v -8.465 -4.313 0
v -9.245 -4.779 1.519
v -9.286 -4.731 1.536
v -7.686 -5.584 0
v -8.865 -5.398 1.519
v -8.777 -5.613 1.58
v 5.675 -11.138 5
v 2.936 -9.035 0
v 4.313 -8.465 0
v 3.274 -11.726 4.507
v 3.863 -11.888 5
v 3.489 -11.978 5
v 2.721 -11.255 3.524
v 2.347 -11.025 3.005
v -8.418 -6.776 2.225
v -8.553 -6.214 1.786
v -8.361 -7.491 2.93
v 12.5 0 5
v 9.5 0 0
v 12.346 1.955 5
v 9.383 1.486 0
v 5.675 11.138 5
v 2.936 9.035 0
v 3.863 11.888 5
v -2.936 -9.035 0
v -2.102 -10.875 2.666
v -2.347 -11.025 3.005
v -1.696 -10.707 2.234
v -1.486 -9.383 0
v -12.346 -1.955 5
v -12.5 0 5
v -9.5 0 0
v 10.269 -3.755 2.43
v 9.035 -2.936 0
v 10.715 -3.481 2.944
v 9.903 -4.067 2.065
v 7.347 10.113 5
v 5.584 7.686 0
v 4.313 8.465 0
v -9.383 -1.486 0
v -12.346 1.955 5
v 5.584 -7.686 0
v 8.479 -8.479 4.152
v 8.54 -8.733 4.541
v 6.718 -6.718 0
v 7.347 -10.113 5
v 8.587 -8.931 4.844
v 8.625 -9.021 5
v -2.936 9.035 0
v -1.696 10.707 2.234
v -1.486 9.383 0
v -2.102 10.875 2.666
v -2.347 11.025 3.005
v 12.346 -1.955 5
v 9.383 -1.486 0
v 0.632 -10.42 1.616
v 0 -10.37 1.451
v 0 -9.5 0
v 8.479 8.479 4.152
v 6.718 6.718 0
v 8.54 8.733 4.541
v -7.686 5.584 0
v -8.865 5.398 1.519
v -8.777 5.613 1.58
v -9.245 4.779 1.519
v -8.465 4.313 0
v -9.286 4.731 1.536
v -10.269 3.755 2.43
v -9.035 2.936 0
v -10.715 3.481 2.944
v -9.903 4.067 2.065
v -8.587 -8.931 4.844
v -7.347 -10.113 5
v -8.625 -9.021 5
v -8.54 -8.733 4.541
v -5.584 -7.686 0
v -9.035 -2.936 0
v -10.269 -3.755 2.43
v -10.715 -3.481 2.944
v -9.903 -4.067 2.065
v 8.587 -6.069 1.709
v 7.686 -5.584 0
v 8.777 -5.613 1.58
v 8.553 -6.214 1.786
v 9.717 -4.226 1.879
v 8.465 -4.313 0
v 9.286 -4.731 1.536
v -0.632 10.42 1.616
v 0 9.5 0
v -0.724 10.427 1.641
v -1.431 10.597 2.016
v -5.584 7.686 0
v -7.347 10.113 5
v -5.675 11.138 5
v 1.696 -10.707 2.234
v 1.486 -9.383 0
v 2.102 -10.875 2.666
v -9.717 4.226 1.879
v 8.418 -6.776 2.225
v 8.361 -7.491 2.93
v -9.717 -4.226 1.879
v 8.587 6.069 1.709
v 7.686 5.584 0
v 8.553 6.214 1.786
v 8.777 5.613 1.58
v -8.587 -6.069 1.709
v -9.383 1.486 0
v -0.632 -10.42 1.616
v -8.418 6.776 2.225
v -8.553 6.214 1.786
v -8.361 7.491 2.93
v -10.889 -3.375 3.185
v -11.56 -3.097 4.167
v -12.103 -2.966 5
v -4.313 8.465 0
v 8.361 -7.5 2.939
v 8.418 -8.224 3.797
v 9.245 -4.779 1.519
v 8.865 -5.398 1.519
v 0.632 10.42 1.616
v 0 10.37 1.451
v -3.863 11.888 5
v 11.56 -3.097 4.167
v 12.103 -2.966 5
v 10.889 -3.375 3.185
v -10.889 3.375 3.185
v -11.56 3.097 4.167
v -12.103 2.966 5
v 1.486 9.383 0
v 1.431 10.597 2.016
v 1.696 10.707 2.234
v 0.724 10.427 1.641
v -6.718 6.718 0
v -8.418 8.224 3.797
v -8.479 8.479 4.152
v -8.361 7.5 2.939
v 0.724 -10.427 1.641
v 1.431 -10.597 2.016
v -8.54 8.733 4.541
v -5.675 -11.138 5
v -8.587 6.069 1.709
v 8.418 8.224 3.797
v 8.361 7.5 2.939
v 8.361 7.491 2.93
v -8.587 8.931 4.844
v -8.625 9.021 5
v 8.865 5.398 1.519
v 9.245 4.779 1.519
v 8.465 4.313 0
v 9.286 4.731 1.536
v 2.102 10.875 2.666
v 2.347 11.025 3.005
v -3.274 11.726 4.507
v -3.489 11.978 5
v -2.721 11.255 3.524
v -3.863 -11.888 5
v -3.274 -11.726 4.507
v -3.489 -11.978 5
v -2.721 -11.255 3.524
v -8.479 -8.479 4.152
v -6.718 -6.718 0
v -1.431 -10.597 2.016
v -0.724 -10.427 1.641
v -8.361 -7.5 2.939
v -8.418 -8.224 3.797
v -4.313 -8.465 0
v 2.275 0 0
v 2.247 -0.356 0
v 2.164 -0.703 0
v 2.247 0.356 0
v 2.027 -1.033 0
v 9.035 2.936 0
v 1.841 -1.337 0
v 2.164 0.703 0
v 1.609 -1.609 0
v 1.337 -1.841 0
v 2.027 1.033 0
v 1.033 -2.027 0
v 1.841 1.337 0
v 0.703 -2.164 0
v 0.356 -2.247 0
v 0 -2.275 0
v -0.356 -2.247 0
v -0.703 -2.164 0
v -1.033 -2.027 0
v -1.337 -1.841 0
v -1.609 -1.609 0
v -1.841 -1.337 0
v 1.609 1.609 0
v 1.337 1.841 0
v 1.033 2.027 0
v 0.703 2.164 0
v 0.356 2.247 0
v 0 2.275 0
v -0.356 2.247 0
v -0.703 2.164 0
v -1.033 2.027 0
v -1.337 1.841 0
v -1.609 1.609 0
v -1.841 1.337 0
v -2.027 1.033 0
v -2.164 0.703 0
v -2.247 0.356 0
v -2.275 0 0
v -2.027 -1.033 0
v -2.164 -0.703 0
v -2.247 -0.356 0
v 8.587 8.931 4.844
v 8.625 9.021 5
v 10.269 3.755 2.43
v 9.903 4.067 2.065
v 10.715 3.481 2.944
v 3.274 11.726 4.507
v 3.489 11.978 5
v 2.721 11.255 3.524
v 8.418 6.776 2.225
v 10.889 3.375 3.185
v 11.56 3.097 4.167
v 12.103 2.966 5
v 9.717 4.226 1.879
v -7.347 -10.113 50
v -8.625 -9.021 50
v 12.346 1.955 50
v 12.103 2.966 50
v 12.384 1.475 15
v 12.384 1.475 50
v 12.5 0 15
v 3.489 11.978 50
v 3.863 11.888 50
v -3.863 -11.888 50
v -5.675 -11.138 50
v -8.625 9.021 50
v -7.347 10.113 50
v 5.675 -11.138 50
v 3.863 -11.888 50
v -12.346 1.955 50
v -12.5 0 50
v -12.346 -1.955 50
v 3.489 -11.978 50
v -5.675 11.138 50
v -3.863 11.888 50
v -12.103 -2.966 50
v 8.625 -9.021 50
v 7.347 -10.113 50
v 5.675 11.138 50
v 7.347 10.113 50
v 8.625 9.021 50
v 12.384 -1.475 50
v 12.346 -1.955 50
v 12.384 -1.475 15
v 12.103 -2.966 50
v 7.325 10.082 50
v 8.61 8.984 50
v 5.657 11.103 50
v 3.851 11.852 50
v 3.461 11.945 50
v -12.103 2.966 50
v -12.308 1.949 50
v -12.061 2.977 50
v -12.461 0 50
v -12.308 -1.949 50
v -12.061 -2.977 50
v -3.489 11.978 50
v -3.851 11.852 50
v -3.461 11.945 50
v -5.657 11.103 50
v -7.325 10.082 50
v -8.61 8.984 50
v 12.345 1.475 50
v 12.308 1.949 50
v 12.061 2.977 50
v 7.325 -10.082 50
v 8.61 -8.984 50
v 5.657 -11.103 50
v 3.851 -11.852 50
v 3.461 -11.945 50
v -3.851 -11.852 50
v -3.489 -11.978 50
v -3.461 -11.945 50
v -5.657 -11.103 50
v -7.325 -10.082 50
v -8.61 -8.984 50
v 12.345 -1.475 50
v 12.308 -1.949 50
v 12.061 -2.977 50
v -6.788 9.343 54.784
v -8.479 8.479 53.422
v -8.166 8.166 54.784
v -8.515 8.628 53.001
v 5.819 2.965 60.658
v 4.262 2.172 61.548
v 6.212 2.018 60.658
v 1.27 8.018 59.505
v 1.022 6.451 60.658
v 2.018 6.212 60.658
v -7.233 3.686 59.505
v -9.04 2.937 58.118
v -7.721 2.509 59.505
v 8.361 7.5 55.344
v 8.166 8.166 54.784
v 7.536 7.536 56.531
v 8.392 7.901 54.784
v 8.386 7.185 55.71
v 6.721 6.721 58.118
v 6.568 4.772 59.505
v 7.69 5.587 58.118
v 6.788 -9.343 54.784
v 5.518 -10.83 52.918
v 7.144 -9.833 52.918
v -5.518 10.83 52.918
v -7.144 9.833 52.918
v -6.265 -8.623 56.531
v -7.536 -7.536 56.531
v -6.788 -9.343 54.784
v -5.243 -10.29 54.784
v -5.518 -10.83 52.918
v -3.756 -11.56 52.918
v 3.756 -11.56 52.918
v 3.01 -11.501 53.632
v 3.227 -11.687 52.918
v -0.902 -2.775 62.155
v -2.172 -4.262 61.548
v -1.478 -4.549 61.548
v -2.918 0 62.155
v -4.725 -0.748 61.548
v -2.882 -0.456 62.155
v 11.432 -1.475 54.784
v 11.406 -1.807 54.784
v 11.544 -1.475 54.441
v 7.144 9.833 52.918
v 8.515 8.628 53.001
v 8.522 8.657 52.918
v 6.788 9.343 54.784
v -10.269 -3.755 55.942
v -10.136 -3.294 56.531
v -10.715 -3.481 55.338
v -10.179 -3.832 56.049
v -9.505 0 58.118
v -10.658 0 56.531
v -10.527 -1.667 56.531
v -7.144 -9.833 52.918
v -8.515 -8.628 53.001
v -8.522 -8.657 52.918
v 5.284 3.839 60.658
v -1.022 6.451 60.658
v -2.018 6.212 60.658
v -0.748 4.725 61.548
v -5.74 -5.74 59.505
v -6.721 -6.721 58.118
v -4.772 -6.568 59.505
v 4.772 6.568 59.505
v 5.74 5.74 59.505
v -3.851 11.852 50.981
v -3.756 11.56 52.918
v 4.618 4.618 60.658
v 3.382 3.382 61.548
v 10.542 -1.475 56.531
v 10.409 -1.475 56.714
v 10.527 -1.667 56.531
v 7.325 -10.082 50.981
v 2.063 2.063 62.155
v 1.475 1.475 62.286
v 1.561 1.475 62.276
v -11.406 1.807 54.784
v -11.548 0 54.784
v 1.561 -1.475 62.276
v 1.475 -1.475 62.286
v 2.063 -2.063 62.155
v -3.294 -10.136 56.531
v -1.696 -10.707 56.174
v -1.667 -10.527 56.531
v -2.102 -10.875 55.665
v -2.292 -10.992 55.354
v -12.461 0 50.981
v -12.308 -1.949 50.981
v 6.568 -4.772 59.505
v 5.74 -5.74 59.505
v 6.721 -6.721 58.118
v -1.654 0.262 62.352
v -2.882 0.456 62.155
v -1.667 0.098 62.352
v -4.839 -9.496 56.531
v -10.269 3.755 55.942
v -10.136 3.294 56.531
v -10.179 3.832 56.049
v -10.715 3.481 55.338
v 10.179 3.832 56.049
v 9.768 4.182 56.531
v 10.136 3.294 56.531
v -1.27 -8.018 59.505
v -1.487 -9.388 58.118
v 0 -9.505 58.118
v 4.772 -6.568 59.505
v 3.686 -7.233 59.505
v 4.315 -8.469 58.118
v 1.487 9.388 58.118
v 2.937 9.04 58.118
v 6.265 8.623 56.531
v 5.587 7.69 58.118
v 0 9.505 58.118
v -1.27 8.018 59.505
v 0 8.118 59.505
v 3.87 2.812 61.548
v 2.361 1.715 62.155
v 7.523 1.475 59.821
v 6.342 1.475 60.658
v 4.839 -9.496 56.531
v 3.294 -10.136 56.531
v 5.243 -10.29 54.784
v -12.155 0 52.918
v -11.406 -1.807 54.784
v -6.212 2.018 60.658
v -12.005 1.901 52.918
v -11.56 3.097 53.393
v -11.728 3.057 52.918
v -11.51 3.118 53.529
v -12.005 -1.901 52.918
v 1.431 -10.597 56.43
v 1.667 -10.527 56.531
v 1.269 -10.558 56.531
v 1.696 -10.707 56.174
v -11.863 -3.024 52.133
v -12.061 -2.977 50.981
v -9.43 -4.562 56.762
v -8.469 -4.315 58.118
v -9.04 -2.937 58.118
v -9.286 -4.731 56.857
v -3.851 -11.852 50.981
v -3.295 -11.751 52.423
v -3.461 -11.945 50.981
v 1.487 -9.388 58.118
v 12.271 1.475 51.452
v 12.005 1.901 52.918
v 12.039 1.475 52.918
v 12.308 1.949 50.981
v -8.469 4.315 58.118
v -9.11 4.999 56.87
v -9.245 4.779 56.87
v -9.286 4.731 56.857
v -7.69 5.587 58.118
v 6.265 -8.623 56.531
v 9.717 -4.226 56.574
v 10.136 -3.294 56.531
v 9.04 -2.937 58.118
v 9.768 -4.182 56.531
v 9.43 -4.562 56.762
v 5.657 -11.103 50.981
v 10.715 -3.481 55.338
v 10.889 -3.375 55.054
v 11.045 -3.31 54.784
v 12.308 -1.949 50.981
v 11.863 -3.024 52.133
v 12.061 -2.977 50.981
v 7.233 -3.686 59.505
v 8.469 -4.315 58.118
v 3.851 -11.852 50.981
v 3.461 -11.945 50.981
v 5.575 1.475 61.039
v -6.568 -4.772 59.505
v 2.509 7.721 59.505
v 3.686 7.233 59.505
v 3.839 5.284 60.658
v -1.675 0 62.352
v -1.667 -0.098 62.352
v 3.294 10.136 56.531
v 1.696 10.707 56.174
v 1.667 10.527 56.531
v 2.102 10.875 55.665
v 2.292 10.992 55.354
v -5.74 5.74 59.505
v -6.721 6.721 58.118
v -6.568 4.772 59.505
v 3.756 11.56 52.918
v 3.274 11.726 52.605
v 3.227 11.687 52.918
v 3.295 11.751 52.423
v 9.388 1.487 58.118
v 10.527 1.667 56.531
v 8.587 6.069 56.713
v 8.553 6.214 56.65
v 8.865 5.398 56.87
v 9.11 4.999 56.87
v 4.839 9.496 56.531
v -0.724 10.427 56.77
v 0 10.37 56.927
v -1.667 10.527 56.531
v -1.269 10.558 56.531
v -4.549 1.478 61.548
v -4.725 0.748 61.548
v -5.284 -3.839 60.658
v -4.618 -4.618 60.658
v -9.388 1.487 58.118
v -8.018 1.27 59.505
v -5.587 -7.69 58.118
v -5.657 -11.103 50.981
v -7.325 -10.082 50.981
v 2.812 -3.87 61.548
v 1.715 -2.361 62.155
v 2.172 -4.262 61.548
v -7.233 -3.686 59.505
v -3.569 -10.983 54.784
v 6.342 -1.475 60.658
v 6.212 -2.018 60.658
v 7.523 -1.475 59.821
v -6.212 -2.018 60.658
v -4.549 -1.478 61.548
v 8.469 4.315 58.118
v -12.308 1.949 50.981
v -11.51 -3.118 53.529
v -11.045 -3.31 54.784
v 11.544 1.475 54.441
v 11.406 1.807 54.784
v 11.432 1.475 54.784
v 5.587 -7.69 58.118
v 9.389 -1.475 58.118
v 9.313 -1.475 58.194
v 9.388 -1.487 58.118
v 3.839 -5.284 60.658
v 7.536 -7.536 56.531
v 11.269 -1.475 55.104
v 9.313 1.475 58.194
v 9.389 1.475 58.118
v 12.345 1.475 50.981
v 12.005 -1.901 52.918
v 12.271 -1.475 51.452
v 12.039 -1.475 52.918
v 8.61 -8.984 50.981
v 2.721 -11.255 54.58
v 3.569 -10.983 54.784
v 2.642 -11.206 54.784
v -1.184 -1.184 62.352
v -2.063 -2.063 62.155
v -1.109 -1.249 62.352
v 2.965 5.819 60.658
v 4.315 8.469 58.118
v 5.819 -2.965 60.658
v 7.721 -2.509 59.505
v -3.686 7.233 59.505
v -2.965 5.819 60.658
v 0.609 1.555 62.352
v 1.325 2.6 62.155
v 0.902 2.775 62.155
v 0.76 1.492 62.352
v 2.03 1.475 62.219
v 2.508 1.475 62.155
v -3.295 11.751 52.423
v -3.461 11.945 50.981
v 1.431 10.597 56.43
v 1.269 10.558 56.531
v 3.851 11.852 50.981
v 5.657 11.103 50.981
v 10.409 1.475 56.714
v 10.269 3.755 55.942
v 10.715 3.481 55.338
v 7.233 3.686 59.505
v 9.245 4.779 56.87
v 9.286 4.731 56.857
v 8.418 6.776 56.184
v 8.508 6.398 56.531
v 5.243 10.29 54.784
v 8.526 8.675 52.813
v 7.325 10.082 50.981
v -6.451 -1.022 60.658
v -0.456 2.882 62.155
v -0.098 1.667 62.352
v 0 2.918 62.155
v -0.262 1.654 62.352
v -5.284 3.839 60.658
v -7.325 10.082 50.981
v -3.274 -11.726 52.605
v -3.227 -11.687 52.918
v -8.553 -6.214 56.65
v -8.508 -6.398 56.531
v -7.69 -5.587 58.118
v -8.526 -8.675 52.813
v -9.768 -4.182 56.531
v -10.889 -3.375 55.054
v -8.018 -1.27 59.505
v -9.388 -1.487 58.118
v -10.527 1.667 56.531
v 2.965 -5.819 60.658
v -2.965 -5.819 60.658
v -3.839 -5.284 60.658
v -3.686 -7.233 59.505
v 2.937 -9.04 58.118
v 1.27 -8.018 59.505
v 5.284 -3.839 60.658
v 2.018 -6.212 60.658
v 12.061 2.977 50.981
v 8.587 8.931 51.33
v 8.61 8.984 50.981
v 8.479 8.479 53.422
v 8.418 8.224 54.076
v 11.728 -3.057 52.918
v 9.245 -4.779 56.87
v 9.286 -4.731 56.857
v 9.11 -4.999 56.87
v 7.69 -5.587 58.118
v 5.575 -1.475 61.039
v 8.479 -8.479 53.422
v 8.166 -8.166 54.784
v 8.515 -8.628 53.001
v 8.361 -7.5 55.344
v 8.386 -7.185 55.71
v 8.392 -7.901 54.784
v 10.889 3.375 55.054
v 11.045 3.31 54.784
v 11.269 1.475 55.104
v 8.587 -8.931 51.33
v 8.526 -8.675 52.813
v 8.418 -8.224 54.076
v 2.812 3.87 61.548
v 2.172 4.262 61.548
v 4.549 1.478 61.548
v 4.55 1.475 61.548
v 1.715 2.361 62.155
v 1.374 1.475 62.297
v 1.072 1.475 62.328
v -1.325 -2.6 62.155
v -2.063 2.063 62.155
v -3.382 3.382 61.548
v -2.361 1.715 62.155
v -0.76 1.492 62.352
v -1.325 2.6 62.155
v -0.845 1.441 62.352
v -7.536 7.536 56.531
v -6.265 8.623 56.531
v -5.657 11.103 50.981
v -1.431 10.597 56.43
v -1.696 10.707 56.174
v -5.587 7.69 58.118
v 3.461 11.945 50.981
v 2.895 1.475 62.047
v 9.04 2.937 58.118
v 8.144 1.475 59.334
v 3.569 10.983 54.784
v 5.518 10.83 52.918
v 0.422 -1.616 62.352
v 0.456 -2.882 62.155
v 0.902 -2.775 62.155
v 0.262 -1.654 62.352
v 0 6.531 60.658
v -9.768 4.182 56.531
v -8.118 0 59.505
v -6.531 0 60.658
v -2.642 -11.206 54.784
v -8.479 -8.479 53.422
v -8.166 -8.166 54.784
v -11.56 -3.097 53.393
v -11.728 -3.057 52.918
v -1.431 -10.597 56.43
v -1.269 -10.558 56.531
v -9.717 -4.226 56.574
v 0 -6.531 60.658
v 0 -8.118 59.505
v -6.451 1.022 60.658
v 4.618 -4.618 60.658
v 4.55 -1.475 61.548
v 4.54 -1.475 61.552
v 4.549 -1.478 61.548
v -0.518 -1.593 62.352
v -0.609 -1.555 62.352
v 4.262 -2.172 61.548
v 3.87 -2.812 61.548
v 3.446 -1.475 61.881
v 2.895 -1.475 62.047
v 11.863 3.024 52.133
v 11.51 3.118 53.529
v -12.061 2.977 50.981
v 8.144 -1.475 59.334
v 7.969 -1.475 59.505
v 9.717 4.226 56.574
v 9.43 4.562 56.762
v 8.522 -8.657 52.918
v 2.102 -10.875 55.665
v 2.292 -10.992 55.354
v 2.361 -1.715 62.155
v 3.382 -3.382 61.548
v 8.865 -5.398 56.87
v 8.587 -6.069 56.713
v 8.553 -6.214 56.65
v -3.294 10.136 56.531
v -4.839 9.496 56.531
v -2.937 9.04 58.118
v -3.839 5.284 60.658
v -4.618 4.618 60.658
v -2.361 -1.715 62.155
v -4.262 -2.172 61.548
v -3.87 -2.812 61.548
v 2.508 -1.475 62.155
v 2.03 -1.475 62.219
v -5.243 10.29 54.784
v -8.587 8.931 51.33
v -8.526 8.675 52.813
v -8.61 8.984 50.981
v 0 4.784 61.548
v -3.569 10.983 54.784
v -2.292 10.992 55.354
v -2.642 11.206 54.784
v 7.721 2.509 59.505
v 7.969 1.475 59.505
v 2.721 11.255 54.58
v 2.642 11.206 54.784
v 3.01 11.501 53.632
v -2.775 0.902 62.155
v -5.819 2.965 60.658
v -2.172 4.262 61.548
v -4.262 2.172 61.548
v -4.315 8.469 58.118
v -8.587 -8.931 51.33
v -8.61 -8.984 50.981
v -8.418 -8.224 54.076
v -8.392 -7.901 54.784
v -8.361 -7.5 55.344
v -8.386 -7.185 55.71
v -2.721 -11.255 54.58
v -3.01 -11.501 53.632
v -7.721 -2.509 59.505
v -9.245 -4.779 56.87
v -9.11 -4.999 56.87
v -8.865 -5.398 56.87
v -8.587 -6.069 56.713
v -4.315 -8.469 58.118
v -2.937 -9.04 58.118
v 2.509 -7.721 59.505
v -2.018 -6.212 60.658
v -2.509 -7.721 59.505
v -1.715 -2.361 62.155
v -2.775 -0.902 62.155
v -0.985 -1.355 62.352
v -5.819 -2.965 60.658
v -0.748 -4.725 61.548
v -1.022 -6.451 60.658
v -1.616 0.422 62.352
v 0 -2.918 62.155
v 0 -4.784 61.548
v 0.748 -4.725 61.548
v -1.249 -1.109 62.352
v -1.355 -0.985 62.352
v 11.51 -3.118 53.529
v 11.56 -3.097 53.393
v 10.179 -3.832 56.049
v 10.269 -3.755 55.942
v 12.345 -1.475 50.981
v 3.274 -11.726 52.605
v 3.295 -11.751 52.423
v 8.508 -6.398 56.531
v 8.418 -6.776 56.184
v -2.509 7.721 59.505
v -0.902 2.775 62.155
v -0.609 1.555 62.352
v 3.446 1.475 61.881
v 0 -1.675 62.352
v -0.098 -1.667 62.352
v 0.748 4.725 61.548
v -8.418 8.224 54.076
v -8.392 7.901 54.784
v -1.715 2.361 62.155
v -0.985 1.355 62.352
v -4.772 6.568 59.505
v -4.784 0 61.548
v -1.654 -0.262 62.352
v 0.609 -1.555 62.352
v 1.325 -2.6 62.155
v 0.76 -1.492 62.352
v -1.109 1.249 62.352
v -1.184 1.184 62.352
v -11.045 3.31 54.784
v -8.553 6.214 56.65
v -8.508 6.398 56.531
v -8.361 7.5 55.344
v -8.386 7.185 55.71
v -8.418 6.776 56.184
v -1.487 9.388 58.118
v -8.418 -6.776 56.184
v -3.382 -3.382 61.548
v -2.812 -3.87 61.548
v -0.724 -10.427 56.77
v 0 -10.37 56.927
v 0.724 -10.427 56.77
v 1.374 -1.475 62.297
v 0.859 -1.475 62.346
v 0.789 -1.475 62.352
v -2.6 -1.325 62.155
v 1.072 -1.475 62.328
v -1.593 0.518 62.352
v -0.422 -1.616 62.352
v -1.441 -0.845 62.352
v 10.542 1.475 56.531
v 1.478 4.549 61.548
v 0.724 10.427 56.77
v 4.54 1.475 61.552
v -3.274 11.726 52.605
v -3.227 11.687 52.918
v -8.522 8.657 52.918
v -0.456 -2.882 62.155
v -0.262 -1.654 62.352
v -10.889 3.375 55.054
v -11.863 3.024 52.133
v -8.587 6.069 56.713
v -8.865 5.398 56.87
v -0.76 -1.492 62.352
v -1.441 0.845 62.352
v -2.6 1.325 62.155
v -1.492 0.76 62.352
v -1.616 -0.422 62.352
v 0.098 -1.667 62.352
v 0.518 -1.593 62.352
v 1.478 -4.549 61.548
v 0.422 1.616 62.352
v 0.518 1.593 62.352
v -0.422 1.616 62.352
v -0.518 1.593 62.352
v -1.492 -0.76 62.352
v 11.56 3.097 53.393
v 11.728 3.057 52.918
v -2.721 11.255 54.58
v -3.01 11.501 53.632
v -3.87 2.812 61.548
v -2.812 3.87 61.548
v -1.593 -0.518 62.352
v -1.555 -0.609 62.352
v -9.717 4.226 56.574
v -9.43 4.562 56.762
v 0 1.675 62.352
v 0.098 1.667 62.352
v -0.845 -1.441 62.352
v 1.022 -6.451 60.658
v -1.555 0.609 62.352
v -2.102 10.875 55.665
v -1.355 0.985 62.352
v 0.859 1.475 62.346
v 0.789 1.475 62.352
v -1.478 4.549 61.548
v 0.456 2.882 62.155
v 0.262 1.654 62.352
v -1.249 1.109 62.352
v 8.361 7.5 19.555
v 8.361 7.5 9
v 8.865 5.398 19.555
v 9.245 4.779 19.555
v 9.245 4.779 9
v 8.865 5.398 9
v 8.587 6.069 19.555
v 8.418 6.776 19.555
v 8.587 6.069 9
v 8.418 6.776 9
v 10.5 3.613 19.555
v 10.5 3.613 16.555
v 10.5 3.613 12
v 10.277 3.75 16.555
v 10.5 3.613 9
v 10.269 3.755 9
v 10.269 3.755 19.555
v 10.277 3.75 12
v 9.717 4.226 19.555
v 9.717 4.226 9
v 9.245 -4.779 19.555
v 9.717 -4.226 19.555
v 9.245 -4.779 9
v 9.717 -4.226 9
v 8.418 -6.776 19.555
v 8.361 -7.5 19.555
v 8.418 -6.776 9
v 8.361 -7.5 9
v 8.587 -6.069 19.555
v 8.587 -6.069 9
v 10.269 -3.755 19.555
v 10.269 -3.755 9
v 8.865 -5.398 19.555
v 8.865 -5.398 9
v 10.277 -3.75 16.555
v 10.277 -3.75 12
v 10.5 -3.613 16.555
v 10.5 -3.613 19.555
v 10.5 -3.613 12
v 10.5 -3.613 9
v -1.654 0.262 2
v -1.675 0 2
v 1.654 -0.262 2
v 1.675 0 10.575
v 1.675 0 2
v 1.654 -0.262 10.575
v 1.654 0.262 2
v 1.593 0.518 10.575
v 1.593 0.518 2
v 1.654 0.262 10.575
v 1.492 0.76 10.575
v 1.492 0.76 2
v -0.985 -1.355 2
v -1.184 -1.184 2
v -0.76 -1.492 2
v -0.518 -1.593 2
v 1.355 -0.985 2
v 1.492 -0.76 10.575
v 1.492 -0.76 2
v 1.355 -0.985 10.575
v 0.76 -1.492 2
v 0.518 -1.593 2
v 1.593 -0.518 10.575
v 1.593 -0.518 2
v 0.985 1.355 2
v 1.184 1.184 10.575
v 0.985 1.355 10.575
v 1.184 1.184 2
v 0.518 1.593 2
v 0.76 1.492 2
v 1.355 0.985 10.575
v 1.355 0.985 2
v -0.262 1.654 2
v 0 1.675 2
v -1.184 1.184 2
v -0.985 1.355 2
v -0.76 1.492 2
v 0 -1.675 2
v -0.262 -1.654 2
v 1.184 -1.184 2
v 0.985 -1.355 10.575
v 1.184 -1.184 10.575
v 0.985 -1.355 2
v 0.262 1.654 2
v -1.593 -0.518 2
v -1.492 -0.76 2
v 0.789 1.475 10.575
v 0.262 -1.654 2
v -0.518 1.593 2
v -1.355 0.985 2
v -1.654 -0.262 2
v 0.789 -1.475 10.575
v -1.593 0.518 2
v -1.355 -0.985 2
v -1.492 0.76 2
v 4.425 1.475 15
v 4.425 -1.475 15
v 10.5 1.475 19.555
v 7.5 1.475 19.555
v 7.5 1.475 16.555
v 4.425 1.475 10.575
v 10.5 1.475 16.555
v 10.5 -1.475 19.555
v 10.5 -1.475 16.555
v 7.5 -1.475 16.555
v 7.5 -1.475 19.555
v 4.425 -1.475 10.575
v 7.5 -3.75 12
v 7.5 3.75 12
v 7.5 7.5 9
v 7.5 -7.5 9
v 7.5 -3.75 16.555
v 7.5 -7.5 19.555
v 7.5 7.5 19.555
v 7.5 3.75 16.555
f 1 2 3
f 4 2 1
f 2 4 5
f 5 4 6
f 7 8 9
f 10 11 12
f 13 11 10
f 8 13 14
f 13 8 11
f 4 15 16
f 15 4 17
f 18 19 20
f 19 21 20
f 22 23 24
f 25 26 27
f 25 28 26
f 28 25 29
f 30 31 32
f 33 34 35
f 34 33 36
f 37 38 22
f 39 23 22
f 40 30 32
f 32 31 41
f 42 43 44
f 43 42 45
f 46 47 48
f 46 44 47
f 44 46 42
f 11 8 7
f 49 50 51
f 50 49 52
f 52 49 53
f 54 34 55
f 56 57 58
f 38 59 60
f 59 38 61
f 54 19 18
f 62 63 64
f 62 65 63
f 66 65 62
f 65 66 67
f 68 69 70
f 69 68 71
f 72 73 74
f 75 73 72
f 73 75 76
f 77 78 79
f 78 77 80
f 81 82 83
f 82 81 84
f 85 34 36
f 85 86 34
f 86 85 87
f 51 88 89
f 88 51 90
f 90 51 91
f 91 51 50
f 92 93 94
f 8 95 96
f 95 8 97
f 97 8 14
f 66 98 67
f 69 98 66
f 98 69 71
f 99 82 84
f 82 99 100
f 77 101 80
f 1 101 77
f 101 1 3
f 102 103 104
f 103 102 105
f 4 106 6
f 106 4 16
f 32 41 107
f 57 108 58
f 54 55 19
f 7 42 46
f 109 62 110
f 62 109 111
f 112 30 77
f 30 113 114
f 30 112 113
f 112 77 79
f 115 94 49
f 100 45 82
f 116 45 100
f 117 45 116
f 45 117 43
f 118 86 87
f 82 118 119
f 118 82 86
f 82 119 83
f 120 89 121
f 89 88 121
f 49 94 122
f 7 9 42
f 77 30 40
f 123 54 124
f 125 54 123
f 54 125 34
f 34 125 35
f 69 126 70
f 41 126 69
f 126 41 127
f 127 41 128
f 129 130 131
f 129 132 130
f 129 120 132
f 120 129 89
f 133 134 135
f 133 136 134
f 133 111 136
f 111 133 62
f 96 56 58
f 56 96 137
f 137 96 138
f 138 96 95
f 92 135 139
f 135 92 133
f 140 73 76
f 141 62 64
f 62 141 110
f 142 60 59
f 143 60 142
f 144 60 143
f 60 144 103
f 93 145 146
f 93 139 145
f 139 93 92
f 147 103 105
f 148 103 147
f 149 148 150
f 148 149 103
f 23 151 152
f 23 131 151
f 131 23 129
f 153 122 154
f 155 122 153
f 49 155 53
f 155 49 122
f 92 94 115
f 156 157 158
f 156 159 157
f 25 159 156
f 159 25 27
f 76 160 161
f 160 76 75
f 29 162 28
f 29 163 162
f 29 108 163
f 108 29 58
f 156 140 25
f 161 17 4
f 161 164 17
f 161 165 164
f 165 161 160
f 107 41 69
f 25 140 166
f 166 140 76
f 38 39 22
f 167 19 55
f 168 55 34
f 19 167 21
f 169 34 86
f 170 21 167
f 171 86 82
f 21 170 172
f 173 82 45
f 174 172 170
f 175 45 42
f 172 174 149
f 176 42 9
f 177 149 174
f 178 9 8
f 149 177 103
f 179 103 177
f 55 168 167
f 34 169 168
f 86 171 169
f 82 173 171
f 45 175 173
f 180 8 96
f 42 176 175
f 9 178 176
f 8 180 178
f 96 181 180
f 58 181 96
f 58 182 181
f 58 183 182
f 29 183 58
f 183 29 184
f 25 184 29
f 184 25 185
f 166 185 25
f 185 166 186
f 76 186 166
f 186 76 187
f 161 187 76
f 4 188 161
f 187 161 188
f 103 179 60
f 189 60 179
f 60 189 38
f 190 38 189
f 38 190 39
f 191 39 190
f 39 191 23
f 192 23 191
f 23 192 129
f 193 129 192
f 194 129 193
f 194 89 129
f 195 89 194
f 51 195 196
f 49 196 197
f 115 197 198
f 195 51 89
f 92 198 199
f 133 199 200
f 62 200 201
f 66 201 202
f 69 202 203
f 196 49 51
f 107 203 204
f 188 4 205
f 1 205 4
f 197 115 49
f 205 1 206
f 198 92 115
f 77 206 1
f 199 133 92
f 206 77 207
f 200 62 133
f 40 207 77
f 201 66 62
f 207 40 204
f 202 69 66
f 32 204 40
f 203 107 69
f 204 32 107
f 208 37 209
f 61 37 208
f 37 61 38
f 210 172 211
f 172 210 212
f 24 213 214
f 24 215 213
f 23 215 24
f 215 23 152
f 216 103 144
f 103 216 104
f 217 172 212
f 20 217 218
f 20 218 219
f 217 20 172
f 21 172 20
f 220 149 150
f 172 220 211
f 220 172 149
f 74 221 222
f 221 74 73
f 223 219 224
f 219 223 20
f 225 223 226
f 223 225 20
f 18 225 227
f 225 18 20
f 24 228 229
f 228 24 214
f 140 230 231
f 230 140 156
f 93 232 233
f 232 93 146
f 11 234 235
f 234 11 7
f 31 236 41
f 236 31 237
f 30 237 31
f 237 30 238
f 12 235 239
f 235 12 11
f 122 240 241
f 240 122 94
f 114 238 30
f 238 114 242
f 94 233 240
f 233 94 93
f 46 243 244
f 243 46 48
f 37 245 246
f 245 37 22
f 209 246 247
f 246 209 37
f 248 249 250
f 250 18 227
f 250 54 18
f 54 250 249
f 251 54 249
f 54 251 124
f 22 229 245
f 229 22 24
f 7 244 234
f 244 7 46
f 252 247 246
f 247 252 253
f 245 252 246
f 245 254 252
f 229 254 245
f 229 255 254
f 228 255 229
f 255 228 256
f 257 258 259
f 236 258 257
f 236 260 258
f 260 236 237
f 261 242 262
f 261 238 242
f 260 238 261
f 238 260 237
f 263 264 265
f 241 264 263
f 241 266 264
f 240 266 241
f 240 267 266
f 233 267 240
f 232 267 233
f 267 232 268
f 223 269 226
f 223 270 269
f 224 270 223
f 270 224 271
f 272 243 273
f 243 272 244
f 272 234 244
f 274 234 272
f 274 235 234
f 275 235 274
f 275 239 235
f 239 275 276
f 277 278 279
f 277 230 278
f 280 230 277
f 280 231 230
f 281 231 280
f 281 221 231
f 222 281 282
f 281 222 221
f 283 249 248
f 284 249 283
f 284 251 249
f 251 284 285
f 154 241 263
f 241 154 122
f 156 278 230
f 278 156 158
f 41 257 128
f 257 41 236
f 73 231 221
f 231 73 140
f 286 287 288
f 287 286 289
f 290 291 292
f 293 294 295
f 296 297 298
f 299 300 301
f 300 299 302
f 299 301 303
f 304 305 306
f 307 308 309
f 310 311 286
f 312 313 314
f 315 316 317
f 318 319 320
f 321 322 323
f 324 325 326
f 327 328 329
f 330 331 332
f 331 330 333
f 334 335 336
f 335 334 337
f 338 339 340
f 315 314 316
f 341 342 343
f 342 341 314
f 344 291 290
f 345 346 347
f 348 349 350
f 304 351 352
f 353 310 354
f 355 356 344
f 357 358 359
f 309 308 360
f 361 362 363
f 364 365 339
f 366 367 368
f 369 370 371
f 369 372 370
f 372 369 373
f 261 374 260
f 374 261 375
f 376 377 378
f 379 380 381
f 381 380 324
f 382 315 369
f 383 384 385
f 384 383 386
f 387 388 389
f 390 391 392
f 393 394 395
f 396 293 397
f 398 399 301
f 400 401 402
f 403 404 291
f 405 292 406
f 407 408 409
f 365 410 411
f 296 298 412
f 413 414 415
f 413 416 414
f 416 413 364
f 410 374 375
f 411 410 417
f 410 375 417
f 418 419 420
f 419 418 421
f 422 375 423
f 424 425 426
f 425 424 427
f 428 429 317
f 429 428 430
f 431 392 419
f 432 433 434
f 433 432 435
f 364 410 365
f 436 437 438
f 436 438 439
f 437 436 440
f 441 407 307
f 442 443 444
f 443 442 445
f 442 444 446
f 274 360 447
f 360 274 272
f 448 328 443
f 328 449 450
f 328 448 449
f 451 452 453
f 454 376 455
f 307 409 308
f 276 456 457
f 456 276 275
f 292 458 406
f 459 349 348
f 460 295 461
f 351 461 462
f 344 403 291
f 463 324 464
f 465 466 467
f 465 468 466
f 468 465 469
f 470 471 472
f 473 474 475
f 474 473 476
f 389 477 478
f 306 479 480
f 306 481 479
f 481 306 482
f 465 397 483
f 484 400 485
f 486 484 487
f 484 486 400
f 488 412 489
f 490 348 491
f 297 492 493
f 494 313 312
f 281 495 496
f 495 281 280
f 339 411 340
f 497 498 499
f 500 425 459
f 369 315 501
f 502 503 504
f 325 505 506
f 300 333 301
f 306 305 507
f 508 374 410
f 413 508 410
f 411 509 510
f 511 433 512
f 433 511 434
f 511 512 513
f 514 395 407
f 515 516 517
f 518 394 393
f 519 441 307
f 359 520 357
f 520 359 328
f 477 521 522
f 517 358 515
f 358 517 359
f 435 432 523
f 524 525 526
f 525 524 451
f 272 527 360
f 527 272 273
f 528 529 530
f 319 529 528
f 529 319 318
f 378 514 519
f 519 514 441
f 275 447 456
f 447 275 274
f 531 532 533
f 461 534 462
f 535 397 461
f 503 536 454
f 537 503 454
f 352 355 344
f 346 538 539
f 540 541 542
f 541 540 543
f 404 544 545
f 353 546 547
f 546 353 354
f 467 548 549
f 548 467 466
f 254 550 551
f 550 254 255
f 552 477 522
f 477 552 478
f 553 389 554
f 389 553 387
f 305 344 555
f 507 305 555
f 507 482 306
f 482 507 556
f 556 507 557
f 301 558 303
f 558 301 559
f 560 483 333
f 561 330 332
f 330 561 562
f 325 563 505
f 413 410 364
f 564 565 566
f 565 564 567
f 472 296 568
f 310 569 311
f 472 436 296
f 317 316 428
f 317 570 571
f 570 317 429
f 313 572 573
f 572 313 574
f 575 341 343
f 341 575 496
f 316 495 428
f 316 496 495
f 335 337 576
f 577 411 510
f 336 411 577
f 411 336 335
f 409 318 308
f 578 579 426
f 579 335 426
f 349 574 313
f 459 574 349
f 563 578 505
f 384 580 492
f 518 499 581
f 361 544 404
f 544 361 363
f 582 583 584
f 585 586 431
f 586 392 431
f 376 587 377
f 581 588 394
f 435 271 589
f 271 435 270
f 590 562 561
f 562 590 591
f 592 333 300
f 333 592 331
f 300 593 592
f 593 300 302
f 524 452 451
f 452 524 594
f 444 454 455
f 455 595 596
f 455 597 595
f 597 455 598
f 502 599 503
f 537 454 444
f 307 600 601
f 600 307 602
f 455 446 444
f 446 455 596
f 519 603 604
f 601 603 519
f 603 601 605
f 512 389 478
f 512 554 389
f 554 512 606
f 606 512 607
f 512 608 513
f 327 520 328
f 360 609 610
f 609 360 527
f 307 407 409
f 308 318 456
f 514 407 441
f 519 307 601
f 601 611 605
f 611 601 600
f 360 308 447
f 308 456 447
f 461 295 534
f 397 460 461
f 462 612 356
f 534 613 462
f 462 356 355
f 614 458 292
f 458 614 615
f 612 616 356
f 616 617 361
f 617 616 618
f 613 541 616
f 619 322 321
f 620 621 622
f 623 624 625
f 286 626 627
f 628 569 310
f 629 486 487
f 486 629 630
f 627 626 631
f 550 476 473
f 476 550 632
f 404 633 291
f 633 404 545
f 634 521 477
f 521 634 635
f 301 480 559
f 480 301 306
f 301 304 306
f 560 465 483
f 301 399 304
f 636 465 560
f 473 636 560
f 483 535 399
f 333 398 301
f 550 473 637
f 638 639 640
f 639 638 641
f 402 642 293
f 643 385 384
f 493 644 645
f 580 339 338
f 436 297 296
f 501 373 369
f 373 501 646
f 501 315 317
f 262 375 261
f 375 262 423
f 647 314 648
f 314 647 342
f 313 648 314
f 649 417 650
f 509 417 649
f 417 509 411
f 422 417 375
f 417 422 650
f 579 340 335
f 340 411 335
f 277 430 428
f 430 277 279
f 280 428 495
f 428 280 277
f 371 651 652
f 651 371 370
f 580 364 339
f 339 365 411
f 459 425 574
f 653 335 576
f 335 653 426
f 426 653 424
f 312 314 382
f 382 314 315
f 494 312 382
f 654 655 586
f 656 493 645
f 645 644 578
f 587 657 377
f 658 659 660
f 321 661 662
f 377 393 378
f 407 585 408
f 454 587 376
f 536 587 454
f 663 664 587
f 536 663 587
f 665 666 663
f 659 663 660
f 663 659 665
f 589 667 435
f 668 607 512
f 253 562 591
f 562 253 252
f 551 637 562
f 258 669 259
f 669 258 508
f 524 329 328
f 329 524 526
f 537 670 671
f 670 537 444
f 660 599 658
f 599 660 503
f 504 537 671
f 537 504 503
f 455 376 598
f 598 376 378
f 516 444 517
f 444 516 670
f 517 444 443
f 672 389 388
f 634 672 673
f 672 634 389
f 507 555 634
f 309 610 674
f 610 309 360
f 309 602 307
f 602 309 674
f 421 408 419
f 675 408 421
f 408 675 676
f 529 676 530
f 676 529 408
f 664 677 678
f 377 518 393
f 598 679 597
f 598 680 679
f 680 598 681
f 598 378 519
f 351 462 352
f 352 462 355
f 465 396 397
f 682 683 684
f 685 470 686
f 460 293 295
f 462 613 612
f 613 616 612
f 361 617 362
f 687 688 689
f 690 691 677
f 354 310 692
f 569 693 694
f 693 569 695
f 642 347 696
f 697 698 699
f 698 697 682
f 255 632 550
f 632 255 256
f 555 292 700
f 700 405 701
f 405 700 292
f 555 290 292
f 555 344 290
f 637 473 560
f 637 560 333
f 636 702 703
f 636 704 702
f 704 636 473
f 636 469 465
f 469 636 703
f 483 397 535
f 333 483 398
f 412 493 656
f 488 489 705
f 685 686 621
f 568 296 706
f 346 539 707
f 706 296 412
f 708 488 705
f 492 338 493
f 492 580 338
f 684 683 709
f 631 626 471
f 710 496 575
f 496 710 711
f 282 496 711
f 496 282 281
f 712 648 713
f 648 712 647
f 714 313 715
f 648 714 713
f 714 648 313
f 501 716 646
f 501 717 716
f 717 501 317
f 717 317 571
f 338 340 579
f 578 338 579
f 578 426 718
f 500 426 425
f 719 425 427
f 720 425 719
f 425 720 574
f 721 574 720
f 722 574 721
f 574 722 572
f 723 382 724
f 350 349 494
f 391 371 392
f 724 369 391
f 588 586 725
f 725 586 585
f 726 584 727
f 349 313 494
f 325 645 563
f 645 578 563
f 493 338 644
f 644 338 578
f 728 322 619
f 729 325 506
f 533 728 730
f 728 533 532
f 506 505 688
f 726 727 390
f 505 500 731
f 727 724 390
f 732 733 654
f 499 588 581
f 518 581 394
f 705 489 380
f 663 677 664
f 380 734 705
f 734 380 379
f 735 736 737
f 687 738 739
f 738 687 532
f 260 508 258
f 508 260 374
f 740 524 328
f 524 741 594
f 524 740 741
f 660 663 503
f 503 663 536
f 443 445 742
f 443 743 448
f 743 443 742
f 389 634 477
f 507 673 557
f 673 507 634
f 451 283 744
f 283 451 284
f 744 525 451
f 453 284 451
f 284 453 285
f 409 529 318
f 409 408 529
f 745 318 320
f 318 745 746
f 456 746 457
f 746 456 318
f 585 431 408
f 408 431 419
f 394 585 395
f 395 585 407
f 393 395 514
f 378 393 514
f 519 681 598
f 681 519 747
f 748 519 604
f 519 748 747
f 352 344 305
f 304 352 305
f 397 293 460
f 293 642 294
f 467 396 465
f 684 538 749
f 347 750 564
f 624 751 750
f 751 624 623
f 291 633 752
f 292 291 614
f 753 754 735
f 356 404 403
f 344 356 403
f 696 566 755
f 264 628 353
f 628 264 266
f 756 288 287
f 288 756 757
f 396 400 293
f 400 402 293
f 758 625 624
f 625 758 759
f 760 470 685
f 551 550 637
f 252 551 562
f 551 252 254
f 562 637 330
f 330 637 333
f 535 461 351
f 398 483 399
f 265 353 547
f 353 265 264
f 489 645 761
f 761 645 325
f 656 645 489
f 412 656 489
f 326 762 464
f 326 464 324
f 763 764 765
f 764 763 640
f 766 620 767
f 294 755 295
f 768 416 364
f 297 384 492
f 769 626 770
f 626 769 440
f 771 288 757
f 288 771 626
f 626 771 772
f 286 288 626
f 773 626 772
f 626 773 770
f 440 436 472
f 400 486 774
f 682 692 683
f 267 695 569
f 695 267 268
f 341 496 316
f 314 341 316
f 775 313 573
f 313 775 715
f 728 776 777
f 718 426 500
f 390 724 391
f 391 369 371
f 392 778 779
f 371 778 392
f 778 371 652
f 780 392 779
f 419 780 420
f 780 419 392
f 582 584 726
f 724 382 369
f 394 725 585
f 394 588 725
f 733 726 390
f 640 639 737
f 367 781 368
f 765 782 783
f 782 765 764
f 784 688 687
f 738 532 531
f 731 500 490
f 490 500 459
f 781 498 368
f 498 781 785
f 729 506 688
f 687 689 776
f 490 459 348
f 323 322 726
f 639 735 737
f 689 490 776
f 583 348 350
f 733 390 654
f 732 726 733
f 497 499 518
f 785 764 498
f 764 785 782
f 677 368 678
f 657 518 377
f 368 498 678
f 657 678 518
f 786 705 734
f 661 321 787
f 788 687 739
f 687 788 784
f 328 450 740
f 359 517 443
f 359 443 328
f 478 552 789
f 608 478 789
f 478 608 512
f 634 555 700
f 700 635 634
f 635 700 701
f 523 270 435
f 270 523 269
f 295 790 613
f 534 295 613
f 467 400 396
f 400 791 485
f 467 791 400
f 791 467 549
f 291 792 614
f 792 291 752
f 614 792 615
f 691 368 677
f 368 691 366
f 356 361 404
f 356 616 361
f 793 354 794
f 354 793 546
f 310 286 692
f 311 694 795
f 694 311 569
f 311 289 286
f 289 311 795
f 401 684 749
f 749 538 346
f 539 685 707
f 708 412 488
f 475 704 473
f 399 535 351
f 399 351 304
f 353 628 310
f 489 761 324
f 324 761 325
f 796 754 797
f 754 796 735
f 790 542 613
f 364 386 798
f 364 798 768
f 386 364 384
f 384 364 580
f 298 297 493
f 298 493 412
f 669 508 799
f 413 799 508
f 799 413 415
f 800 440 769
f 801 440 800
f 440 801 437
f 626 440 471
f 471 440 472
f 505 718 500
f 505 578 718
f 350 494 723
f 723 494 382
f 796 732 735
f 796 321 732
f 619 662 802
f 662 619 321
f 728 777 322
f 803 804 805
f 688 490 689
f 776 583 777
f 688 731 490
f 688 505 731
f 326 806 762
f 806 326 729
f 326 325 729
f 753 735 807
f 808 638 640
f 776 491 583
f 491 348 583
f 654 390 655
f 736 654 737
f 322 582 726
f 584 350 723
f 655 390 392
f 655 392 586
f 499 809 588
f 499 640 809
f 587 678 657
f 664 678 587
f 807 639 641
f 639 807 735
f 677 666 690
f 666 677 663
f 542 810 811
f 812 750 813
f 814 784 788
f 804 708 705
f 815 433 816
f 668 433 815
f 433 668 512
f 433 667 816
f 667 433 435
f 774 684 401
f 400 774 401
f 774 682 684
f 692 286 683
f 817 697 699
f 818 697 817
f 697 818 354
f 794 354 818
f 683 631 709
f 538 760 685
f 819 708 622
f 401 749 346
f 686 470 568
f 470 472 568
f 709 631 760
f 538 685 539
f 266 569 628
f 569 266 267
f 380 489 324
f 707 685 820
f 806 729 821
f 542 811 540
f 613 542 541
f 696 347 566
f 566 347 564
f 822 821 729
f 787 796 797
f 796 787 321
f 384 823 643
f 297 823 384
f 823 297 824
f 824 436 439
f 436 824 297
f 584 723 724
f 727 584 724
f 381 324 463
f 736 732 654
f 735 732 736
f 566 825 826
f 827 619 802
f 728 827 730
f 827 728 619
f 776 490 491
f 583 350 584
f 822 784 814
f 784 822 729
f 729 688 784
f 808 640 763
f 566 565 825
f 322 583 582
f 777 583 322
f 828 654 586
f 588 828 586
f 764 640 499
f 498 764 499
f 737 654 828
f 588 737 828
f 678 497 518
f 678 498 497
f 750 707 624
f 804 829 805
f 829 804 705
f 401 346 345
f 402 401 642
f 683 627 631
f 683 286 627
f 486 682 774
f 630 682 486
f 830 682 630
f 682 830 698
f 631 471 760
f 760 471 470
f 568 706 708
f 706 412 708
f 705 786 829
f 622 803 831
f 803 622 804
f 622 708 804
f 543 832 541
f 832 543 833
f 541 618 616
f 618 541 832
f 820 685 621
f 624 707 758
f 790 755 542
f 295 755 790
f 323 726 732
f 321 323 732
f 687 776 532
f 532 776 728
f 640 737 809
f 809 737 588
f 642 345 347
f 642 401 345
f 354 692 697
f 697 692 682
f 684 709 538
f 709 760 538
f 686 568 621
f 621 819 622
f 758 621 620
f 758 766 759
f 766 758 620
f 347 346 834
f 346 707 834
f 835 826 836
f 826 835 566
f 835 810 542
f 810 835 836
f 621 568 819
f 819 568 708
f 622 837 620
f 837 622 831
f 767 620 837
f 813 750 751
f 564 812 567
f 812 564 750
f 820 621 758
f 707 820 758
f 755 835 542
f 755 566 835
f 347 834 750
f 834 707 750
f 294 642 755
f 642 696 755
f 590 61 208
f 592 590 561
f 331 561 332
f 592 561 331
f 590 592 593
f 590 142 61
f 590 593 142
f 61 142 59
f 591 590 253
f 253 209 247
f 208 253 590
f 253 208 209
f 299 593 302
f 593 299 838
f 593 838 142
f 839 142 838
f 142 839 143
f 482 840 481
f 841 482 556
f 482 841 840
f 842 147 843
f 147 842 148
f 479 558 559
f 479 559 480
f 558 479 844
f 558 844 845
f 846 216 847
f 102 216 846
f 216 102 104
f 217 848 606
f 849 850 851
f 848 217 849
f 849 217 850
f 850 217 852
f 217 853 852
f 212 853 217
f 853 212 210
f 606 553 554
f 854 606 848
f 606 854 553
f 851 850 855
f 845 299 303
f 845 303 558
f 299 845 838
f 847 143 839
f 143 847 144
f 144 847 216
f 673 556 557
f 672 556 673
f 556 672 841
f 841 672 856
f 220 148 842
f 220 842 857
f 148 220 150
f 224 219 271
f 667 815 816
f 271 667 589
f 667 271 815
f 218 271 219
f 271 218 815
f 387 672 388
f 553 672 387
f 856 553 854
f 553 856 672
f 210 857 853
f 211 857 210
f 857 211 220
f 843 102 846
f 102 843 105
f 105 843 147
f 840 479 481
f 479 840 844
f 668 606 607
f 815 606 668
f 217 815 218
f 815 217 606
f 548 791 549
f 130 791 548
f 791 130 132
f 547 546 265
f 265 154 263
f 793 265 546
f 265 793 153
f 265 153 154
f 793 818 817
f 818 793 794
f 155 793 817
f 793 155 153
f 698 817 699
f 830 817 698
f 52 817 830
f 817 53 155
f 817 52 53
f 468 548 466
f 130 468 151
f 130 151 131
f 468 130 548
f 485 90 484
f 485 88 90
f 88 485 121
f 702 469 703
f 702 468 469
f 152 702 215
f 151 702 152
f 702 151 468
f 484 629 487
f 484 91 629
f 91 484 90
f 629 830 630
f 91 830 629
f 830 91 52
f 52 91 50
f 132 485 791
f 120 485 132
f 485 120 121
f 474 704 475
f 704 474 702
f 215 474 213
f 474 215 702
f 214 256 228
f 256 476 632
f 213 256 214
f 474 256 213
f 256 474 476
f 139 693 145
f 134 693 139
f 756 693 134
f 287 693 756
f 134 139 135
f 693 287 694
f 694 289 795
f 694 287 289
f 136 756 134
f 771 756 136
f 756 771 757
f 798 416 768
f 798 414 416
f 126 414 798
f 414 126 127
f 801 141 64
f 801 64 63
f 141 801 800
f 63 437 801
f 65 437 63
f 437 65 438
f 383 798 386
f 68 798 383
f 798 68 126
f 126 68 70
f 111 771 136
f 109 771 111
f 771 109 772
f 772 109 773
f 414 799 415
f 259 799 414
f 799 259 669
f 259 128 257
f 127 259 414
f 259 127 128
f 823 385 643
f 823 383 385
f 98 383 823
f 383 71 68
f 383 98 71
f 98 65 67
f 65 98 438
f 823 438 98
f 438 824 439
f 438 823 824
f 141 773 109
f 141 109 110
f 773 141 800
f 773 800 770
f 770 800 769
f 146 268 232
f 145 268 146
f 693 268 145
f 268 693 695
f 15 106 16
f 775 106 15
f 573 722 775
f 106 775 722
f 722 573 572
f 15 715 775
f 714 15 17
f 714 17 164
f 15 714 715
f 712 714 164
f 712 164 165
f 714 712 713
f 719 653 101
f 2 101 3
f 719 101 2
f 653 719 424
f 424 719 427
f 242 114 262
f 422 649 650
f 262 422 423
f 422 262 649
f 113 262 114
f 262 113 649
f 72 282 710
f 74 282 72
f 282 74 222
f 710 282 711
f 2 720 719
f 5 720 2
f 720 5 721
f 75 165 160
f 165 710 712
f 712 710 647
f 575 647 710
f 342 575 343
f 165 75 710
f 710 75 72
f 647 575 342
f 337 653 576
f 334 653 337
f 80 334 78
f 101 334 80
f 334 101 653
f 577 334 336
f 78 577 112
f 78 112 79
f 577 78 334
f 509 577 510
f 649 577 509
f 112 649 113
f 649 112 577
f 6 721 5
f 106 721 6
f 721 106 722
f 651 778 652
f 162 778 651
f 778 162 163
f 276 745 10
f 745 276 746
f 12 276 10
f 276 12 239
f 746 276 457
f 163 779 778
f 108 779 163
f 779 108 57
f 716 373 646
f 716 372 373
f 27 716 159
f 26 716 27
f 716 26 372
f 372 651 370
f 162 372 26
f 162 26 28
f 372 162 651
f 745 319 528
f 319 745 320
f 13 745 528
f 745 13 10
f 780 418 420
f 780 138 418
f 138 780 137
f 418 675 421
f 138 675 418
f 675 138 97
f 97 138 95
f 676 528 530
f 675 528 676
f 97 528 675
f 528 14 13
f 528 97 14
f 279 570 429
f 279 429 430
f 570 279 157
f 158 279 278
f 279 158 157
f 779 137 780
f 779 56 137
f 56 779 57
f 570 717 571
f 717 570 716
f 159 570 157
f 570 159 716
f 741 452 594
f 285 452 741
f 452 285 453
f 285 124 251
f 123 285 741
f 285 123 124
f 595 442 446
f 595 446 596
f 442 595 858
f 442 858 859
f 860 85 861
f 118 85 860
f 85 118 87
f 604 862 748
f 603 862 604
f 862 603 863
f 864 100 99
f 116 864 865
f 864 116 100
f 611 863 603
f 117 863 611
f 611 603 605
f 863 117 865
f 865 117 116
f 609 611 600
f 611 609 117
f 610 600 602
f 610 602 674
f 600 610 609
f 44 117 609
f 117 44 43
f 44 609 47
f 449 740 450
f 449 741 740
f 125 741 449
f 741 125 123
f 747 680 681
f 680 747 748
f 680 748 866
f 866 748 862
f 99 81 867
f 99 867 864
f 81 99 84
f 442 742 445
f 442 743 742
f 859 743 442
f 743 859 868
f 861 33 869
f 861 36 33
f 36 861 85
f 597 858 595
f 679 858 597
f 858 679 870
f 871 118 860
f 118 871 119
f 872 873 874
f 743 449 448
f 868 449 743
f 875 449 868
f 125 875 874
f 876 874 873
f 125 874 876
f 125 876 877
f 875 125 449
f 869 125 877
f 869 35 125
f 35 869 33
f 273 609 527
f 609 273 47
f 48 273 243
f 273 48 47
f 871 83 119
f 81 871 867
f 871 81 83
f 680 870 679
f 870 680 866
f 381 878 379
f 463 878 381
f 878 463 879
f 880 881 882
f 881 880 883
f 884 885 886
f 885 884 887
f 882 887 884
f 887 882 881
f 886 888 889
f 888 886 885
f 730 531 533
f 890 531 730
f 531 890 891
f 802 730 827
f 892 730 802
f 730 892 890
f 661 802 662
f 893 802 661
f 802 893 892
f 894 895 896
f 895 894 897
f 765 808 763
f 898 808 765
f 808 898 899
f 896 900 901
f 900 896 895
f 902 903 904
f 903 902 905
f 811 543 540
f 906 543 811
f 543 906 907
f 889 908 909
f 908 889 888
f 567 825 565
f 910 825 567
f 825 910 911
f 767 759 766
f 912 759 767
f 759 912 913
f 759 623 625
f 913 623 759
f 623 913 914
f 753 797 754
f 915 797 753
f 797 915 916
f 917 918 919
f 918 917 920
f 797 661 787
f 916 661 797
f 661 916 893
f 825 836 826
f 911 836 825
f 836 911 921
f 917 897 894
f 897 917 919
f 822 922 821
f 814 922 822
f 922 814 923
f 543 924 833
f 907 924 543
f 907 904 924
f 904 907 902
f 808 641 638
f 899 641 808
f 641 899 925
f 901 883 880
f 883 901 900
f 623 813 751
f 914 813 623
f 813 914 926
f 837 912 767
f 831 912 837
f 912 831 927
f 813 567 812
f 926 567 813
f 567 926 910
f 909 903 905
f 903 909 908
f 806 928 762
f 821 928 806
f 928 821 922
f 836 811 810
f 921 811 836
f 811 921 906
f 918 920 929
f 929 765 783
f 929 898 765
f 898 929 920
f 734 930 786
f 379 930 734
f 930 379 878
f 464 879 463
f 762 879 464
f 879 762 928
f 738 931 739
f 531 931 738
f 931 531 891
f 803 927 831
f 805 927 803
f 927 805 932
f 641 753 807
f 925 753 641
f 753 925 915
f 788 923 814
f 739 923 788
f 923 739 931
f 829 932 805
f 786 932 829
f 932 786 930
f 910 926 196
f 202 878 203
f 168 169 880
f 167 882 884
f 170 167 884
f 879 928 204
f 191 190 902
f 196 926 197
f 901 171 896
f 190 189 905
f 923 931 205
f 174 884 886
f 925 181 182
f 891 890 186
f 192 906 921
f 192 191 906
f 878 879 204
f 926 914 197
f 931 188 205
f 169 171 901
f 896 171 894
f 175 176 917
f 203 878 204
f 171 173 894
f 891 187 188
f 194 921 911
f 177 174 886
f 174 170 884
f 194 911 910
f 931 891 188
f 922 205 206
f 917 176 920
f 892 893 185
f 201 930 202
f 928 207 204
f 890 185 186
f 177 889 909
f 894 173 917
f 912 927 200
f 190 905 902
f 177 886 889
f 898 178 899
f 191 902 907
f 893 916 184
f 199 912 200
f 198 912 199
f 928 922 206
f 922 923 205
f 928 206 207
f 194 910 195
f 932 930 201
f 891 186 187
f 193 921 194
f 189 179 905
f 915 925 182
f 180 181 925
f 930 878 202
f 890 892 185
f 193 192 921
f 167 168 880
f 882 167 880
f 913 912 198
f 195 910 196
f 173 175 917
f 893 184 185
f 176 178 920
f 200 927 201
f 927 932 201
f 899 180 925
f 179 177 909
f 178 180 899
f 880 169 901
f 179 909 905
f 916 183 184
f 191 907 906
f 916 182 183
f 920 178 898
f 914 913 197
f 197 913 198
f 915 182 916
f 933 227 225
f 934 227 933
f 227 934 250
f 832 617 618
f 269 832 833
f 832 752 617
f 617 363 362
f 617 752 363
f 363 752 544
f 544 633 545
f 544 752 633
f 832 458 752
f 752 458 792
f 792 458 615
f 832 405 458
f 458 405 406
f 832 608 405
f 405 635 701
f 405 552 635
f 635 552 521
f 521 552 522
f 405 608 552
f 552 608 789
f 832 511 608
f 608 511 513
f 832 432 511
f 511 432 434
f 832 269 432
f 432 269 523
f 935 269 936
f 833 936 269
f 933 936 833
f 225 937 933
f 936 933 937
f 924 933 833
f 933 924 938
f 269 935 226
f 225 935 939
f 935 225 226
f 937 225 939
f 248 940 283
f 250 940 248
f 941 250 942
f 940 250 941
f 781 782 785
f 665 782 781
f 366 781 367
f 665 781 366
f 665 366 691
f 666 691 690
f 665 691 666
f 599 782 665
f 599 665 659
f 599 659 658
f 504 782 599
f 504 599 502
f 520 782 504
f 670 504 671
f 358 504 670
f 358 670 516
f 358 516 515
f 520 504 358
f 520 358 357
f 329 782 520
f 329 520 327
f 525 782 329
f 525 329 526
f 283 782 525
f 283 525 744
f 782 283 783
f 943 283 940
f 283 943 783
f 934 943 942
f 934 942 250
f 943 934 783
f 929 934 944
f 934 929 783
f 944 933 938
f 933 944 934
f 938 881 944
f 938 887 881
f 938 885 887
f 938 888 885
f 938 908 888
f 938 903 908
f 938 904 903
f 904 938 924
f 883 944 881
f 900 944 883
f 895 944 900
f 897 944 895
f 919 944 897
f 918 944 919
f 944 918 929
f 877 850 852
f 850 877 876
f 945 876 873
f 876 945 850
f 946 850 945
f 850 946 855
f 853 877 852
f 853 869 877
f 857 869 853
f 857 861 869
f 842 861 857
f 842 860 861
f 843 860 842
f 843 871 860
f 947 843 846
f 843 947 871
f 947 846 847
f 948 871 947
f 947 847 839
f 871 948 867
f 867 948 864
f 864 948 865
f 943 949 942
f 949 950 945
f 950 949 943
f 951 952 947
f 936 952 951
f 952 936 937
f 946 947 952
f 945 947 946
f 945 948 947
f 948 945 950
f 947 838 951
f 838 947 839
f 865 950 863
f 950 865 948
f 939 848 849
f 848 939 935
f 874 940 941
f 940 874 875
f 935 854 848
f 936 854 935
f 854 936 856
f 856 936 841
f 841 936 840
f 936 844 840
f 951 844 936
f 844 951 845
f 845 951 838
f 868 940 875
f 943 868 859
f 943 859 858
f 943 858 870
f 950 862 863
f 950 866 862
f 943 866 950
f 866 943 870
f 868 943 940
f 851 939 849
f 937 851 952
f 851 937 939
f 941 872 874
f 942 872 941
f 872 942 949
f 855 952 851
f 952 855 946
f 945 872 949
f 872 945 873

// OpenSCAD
// Diameter of hole for the hex wrench
hex_size = 2.8;

// Increase slot size by this amount
hole_delta = 0.15;

// Diameter of the handle
handle_diameter = 25;

handle(hex_size);

module handle(hex_size)
{
	hex_radius = (hex_size + hole_delta) / 2;
	hex_size = hex_size + hole_delta;
	handle_radius = handle_diameter / 2;
	knurl_offset = handle_radius * 1.2;
	handle_height = 50;
	slot_width = 1.2 * handle_radius;
	zip_tie_back = 0.6 * handle_radius;
	slot_bottom = 15;

	$fn=40;									// Control quality of mesh

	hole_radius = hex_radius + .2;	// Give a little more room for small hole

	difference()
	{
		union()
		{
			cylinder(h = 5, r1 = handle_radius - 3, r2 = handle_radius);
			translate(v=[0, 0, 5])
				cylinder(h = handle_height - 5, r = handle_radius);
			translate(v=[0, 0, handle_height])
				sphere(handle_radius);
		}

		for (angle = [30:60:360])
			translate(v=[knurl_offset * cos(angle), knurl_offset * sin(angle), 0])
				cylinder(h = handle_height + handle_radius, r = handle_radius / 2.7);

		// Shaft hole
		cylinder(h = handle_height + handle_radius, r = hole_radius);

		// Small cone at bottom
		cylinder(h = 2, r1 = hole_radius + .6, r2 = hole_radius);

		// Slot for the wrench
		translate(v=[0, -hex_size / 2, slot_bottom])
			cube(size = [handle_radius, hex_size, handle_height + handle_radius]);

		// Slot for bend in wrench
		translate(v=[0, -hex_size / 2, slot_bottom - 1.5 * hex_size])
			cube(size = [1.5 * hex_size, hex_size, 2 * hex_size]);

		// Lower slot for zip-tie
		translate(v=[zip_tie_back, -slot_width / 2, slot_bottom - 6])
			cube(size=[3, slot_width, 3]);

		// Upper slot for zip tie
		translate(v=[zip_tie_back, -slot_width / 2, slot_bottom + sin(60) * hex_size - 1])
			cube(size=[3, slot_width, 3]);

		// Zip Tie Opening
		translate(v=[zip_tie_back, slot_width / 4, slot_bottom - 6])
			cube(size=[3, slot_width / 4, 6 + sin(60) * hex_size + 2]);

		translate(v=[zip_tie_back, -slot_width / 2, slot_bottom - 6])
			cube(size=[3, slot_width / 4, 6 + sin(60) * hex_size + 2]);
	}
}
